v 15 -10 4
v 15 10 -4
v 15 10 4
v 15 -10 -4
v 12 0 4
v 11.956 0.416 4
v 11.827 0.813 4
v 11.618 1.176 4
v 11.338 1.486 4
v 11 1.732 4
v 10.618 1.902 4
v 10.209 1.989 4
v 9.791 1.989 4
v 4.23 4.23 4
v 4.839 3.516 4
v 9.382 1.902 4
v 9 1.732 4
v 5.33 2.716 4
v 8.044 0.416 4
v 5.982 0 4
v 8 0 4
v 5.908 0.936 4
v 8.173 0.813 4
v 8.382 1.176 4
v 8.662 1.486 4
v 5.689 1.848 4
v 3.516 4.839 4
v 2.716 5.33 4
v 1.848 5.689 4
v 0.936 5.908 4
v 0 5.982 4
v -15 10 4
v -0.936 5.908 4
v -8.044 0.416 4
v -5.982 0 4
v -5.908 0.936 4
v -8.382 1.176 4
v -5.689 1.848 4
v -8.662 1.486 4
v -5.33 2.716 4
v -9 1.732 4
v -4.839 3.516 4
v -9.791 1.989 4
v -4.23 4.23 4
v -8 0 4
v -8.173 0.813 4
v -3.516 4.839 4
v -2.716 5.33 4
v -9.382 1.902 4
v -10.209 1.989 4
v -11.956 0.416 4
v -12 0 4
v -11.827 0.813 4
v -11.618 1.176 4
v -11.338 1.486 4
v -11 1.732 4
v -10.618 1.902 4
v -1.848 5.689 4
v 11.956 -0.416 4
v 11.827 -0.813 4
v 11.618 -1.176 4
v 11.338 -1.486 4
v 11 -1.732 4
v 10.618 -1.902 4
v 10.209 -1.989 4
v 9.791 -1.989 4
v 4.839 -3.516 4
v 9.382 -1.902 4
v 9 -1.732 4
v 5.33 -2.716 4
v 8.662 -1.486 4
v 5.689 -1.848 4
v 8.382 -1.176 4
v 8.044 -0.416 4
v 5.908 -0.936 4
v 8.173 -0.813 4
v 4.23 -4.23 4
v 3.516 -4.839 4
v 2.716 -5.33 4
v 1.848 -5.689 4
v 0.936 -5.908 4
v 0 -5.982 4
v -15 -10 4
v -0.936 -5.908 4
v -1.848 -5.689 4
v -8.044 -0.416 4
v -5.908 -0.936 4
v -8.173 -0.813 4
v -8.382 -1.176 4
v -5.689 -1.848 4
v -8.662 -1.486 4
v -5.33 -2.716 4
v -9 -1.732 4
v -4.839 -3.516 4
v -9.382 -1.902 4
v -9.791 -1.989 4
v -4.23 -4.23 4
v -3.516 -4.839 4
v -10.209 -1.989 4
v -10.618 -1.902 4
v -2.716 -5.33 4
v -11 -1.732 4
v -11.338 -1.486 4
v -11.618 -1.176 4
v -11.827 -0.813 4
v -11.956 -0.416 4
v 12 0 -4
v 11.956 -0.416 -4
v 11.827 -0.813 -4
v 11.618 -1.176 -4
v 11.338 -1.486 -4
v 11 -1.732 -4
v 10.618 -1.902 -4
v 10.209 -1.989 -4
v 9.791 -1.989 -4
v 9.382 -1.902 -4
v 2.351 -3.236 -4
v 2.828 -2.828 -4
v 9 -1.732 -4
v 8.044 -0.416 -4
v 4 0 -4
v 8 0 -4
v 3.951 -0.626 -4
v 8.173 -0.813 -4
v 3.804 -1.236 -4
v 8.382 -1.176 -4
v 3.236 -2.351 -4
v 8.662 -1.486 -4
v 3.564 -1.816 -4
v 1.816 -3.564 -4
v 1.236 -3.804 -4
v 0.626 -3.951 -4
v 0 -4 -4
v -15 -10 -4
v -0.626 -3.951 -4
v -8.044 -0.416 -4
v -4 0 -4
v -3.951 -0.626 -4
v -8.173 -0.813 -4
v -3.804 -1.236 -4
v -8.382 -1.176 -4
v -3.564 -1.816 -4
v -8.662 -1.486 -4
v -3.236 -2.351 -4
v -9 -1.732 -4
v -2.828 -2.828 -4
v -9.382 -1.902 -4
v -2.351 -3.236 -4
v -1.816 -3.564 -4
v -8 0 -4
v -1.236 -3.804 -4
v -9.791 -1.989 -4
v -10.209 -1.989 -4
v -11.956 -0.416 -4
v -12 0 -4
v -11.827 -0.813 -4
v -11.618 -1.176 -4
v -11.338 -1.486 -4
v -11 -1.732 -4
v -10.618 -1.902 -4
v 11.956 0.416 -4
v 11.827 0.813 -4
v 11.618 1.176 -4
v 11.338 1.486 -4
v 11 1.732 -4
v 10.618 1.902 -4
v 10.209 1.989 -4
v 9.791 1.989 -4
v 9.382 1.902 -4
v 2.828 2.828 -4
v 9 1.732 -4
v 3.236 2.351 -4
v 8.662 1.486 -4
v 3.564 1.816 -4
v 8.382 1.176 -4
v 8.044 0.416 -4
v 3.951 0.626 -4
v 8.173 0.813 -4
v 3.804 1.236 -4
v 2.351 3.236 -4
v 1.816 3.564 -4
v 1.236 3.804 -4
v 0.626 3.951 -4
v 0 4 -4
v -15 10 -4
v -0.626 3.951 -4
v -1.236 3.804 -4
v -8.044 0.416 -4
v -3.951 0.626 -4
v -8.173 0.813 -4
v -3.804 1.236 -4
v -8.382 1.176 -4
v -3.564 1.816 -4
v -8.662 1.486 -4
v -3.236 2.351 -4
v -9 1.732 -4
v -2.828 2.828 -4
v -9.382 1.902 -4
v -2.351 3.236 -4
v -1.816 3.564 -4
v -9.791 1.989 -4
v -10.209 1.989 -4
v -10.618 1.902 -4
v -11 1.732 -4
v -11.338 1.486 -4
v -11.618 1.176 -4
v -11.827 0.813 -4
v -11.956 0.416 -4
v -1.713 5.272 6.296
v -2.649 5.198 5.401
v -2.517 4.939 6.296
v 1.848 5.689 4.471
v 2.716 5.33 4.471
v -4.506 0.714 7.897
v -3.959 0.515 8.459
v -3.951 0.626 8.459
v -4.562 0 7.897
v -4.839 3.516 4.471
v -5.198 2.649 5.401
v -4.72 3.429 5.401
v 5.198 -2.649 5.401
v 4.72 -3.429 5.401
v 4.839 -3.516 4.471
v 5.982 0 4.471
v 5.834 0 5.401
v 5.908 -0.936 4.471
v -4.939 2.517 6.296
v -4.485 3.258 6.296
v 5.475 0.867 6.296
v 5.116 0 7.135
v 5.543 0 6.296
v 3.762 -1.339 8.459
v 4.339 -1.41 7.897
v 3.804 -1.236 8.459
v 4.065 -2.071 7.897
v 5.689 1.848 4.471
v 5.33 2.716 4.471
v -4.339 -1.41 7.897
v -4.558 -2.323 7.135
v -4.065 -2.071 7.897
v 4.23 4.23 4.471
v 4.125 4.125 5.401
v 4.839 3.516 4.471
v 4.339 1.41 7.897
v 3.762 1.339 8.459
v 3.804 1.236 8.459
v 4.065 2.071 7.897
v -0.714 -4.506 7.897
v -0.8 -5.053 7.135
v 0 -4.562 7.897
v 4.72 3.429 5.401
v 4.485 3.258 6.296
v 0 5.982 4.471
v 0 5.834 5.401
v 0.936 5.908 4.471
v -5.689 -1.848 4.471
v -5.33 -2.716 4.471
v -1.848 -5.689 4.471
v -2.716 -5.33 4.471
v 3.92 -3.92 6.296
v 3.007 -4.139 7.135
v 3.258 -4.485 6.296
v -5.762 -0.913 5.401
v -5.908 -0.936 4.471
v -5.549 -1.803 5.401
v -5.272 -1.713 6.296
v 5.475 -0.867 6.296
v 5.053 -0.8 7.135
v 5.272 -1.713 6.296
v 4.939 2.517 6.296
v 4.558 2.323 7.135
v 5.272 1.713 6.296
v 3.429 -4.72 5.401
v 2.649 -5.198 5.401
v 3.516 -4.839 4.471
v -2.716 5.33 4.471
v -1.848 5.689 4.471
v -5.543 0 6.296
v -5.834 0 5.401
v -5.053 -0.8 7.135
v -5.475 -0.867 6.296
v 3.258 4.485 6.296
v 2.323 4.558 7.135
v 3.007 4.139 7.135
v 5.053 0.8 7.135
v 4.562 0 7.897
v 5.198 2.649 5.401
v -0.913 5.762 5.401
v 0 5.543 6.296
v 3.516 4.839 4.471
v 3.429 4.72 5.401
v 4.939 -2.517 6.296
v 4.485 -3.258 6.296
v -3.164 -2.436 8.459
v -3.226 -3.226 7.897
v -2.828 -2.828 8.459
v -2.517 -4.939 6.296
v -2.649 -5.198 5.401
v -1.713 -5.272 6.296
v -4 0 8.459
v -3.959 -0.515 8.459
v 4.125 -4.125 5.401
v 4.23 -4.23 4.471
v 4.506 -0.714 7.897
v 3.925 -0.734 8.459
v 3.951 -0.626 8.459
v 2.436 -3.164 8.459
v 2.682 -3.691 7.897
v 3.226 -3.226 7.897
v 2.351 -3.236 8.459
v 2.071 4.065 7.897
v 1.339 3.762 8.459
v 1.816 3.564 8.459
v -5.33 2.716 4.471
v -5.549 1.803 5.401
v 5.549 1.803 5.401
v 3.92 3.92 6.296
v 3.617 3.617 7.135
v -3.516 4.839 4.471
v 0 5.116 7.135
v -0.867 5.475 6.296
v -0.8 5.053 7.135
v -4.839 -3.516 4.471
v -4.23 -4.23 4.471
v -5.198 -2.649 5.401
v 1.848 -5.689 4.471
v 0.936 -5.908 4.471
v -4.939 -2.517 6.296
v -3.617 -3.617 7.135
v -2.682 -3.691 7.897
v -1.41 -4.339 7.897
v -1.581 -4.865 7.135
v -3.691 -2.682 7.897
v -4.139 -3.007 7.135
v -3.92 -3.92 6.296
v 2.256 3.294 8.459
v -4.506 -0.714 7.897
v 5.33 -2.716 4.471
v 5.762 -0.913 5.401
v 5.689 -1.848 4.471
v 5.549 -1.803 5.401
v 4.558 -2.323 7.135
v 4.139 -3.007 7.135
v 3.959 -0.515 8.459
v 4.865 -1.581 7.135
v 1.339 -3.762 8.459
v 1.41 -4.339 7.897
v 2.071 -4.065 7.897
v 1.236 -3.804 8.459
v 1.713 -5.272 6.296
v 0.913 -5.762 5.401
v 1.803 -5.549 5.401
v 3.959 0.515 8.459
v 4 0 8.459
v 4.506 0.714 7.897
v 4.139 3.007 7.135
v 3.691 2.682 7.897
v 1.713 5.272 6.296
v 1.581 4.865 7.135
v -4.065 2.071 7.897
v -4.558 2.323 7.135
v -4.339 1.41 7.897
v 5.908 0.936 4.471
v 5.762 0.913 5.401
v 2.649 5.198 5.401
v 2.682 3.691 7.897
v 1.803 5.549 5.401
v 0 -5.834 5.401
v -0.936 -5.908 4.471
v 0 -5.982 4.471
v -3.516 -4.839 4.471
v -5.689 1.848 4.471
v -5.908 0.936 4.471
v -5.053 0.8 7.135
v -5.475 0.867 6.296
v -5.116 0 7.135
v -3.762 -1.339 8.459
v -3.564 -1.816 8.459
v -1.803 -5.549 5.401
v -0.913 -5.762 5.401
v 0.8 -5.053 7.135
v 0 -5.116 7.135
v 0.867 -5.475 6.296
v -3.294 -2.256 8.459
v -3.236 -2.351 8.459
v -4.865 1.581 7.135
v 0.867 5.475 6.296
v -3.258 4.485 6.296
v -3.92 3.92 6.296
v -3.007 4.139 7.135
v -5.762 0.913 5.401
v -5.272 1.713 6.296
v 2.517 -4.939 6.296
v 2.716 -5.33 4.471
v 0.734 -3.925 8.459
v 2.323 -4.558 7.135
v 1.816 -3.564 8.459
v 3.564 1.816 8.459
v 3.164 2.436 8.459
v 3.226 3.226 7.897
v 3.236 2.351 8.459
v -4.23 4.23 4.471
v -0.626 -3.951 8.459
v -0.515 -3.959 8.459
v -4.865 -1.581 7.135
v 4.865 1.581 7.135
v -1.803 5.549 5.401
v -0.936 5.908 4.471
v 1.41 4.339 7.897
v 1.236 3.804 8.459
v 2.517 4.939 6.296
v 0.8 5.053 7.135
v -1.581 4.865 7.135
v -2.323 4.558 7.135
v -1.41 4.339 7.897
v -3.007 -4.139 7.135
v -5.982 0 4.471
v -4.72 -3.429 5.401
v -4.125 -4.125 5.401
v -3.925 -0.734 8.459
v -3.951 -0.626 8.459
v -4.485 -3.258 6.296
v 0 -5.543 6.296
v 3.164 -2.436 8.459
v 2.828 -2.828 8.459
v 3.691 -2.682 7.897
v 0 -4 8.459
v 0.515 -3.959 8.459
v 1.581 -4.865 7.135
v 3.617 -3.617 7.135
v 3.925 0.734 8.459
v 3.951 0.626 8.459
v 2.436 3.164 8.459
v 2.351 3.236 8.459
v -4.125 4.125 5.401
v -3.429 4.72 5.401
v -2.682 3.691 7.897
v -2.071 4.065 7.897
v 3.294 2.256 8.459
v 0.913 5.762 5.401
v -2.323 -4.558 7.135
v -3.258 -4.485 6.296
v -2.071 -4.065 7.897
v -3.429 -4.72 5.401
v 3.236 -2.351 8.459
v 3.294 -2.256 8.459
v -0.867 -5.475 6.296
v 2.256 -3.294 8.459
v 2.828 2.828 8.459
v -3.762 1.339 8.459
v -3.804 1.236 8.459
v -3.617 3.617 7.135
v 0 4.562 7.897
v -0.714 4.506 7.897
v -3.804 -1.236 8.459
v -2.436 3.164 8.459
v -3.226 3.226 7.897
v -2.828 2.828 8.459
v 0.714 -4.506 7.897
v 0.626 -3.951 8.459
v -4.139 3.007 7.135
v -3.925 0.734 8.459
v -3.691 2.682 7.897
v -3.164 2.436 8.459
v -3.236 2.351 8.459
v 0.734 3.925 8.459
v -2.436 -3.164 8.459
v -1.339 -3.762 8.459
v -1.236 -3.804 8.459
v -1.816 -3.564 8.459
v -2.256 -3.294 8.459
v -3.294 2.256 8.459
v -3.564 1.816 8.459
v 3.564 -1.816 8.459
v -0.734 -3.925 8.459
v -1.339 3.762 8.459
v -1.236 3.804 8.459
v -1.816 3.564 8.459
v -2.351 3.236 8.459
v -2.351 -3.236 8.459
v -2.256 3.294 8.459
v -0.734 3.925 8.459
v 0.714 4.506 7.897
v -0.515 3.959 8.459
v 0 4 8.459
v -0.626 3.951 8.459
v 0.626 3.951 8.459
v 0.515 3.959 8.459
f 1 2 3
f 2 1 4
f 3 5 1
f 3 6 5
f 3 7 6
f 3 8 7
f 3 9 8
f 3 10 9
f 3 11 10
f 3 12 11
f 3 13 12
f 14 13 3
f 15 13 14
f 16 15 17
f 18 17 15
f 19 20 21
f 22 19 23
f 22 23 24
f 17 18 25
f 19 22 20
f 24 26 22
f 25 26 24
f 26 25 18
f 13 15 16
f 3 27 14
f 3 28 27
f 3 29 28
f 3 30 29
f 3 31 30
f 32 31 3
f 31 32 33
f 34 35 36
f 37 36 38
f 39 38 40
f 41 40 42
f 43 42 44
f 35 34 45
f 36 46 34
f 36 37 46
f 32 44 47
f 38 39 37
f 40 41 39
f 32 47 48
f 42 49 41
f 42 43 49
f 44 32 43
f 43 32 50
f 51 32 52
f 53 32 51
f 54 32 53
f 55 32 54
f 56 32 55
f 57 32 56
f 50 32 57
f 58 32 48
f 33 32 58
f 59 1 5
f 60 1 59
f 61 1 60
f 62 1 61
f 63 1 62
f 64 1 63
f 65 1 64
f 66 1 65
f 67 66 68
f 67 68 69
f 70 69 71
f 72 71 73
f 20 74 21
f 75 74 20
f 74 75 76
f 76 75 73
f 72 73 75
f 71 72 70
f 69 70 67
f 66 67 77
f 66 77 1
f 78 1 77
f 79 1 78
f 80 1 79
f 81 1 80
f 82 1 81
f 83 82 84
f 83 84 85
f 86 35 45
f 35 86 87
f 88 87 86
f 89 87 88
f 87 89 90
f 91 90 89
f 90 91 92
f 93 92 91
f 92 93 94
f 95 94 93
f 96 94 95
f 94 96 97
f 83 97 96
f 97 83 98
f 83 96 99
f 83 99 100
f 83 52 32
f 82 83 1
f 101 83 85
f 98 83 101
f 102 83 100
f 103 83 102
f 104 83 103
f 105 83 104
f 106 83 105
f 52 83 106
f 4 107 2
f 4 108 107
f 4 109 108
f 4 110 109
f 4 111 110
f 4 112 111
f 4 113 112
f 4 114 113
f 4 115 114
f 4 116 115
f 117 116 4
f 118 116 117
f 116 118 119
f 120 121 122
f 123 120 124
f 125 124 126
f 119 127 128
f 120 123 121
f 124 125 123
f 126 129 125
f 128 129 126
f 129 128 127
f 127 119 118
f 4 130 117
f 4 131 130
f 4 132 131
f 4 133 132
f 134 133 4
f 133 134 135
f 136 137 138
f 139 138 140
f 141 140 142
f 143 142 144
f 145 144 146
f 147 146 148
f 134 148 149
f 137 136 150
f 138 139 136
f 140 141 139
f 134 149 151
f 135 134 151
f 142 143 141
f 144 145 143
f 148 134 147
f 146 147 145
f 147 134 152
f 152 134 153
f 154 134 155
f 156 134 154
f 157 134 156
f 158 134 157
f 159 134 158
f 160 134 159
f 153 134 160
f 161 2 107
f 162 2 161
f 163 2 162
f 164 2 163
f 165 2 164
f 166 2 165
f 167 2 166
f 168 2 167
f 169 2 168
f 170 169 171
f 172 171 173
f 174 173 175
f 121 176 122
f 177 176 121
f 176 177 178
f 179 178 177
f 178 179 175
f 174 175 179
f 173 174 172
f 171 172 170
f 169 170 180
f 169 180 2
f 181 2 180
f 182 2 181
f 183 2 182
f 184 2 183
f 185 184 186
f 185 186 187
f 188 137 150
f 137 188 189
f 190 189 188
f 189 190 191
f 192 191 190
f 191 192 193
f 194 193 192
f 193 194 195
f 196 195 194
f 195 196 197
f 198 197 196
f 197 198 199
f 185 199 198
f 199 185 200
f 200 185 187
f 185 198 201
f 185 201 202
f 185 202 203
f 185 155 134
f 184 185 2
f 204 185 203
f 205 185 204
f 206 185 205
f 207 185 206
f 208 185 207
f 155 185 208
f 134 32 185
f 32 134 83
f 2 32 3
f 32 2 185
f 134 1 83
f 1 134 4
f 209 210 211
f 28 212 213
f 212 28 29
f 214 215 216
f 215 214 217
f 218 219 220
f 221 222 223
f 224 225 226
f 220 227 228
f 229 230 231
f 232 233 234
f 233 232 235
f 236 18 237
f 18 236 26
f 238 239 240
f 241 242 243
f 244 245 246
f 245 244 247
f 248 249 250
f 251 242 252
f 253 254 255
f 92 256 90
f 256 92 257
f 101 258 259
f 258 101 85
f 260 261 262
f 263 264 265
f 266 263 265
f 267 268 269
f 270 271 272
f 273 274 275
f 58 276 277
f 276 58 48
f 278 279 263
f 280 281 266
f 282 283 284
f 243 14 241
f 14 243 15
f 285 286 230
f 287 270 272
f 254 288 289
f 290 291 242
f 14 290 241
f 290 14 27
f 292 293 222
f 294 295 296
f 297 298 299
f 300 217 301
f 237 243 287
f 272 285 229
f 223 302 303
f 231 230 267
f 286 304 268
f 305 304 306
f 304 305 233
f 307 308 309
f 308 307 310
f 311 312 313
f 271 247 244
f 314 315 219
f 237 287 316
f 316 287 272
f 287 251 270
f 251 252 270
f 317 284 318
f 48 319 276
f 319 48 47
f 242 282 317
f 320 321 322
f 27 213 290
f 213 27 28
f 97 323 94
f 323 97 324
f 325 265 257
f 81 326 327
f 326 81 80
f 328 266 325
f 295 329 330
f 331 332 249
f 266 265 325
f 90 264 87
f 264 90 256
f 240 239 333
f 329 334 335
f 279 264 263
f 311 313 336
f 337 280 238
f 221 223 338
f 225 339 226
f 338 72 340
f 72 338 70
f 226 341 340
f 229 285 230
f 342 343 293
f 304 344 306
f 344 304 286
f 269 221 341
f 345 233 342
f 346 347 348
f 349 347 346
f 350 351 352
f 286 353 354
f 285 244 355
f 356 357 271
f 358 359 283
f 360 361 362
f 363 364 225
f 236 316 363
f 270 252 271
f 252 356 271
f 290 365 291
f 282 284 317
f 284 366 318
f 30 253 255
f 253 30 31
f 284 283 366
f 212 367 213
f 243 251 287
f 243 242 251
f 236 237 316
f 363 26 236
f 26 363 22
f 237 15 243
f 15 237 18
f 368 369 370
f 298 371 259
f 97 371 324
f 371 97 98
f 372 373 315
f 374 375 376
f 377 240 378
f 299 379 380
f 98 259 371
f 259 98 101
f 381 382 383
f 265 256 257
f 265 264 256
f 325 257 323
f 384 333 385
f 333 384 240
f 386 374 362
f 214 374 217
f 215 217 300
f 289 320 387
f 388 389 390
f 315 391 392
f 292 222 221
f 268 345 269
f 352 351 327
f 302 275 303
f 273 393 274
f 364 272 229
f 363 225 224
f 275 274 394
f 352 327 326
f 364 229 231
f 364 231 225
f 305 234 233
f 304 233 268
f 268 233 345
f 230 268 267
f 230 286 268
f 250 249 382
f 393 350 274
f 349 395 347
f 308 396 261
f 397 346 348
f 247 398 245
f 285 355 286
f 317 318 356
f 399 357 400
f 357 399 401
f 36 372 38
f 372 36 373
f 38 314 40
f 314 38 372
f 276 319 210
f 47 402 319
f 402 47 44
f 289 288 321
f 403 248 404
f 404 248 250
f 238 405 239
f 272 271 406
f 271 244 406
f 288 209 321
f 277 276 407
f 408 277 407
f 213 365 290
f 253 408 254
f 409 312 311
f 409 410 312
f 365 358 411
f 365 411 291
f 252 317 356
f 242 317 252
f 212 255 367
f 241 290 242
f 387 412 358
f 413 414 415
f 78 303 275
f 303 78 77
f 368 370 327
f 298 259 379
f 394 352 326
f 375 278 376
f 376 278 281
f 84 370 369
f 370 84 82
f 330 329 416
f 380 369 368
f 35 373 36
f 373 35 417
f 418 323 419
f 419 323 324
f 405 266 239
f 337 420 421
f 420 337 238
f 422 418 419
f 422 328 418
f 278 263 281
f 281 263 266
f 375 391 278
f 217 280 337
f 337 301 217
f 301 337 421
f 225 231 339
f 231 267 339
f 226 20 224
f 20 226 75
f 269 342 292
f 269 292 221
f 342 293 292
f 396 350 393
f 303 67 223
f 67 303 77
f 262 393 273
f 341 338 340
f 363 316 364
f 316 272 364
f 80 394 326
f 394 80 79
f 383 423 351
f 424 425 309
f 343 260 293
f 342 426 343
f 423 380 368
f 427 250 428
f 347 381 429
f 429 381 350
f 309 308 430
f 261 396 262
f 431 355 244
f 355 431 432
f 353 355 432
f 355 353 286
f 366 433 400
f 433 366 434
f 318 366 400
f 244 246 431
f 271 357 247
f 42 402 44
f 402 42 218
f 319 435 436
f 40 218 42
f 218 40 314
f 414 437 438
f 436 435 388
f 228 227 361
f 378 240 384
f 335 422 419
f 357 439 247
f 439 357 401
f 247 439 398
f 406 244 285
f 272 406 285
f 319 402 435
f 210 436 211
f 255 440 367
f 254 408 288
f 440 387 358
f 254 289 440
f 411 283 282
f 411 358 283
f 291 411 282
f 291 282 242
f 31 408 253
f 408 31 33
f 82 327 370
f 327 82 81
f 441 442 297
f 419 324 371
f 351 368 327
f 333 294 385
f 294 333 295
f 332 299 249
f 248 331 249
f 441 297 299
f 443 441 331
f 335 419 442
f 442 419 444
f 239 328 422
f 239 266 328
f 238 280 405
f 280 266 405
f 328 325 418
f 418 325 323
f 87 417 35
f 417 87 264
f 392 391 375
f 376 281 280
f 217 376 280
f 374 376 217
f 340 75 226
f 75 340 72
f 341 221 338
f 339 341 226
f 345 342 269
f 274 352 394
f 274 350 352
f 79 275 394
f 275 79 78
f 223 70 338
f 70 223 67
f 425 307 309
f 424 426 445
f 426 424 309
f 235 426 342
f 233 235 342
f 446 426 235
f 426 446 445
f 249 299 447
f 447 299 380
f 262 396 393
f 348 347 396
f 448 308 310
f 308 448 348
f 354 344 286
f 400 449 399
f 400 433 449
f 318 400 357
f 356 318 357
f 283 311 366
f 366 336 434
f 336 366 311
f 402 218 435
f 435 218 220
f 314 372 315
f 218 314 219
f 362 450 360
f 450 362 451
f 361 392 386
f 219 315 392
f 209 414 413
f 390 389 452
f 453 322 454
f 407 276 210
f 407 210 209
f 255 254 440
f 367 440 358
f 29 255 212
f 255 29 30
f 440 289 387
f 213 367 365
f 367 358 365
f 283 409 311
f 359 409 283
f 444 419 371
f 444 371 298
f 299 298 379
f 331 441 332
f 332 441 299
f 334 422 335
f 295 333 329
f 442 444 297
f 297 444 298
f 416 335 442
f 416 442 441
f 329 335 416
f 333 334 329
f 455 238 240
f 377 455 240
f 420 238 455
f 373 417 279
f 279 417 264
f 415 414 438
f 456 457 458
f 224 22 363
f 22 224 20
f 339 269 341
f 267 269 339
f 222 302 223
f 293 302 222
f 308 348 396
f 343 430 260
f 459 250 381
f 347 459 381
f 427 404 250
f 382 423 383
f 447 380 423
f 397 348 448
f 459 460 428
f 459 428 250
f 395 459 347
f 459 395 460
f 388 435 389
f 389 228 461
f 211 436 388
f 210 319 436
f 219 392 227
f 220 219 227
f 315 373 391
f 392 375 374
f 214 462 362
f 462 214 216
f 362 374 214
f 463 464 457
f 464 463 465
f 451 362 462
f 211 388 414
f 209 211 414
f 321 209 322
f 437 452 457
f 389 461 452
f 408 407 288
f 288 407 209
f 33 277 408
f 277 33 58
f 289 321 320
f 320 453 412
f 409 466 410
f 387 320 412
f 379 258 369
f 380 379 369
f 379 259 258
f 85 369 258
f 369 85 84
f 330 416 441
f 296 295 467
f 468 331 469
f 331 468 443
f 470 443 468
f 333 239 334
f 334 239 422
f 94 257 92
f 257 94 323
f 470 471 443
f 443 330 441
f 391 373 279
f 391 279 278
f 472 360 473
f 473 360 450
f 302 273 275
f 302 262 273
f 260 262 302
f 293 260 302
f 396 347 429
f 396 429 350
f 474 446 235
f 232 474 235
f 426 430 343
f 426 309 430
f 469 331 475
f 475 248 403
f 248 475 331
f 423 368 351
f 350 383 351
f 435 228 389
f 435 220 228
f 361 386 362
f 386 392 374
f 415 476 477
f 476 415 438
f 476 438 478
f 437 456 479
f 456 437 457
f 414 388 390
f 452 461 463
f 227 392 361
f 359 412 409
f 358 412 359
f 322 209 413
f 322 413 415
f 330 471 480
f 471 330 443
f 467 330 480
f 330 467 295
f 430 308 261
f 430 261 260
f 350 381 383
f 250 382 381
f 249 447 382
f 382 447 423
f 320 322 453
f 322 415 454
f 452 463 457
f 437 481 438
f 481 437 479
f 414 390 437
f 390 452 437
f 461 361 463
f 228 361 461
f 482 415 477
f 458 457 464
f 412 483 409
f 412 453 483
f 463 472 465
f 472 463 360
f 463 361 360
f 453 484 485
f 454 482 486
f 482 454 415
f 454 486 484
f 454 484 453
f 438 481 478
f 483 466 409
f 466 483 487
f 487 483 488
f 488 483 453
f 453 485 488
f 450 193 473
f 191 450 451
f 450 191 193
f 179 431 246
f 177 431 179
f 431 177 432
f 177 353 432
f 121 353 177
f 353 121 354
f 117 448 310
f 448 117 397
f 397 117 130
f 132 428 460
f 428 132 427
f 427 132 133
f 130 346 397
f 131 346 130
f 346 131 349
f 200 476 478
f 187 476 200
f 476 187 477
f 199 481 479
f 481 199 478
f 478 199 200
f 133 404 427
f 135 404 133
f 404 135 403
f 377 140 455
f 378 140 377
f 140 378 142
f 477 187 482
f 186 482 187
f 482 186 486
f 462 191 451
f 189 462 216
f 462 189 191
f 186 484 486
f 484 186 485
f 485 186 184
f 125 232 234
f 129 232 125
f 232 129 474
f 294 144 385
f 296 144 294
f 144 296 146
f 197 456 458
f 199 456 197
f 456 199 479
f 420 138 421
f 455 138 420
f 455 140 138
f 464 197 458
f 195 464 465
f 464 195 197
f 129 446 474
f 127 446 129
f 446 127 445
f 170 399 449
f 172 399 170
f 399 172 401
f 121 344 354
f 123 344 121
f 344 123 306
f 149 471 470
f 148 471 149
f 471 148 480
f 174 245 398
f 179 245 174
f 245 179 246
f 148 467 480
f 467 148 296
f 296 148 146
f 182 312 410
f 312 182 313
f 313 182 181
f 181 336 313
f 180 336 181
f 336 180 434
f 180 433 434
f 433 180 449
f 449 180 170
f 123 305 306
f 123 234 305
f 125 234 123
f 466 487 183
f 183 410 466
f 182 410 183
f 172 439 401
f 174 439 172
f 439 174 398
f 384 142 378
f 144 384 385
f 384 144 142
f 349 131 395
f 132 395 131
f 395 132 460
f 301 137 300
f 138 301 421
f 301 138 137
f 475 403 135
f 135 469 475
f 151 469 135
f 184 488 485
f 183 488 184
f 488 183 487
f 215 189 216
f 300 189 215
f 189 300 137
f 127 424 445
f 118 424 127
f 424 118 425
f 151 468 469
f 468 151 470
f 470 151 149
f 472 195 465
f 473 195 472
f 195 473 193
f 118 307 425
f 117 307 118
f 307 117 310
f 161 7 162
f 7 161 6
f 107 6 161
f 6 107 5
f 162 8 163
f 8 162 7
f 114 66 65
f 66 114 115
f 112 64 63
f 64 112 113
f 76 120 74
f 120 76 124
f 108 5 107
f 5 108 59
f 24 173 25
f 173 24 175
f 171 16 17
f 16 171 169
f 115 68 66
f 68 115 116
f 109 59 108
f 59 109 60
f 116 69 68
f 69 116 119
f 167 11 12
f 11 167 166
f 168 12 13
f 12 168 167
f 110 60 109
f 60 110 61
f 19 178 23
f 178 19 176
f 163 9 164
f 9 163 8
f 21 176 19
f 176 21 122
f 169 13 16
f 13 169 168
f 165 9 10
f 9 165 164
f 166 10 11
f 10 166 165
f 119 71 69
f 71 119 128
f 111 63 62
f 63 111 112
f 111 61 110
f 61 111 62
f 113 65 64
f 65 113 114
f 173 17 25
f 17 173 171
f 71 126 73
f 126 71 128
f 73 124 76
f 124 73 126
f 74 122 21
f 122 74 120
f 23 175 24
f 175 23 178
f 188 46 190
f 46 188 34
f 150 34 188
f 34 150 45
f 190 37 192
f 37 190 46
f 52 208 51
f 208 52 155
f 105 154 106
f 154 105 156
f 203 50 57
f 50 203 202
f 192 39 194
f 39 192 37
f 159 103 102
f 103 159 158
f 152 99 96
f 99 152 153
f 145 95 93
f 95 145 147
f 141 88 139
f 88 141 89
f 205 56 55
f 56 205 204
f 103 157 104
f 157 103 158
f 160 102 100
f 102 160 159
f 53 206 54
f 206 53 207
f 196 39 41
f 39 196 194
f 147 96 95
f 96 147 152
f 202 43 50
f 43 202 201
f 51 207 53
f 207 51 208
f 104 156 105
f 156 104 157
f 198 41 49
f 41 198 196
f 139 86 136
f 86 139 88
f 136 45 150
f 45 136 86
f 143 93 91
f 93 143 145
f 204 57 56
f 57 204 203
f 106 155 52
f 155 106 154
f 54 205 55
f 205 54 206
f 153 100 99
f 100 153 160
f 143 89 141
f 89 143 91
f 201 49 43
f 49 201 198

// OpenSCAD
// Boolean CSG: a plate with a rounded-off block and a through-hole and a
// bump, built from cube/cylinder/sphere. CSG runs through a voxel +
// marching-cubes pipeline (see README), so it's not razor-sharp like a
// CAD kernel -- raise "CSG detail" in the toolbar for a cleaner result.

difference() {
    union() {
        cube([30, 20, 8], center = true);
        translate([0, 0, 4]) sphere(r = 6, $fn = 40);
    }
    translate([0, 0, 0]) cylinder(r = 4, h = 30, center = true, $fn = 40);
    translate([10, 0, 0]) cylinder(r = 2, h = 30, center = true, $fn = 30);
    translate([-10, 0, 0]) cylinder(r = 2, h = 30, center = true, $fn = 30);
}
